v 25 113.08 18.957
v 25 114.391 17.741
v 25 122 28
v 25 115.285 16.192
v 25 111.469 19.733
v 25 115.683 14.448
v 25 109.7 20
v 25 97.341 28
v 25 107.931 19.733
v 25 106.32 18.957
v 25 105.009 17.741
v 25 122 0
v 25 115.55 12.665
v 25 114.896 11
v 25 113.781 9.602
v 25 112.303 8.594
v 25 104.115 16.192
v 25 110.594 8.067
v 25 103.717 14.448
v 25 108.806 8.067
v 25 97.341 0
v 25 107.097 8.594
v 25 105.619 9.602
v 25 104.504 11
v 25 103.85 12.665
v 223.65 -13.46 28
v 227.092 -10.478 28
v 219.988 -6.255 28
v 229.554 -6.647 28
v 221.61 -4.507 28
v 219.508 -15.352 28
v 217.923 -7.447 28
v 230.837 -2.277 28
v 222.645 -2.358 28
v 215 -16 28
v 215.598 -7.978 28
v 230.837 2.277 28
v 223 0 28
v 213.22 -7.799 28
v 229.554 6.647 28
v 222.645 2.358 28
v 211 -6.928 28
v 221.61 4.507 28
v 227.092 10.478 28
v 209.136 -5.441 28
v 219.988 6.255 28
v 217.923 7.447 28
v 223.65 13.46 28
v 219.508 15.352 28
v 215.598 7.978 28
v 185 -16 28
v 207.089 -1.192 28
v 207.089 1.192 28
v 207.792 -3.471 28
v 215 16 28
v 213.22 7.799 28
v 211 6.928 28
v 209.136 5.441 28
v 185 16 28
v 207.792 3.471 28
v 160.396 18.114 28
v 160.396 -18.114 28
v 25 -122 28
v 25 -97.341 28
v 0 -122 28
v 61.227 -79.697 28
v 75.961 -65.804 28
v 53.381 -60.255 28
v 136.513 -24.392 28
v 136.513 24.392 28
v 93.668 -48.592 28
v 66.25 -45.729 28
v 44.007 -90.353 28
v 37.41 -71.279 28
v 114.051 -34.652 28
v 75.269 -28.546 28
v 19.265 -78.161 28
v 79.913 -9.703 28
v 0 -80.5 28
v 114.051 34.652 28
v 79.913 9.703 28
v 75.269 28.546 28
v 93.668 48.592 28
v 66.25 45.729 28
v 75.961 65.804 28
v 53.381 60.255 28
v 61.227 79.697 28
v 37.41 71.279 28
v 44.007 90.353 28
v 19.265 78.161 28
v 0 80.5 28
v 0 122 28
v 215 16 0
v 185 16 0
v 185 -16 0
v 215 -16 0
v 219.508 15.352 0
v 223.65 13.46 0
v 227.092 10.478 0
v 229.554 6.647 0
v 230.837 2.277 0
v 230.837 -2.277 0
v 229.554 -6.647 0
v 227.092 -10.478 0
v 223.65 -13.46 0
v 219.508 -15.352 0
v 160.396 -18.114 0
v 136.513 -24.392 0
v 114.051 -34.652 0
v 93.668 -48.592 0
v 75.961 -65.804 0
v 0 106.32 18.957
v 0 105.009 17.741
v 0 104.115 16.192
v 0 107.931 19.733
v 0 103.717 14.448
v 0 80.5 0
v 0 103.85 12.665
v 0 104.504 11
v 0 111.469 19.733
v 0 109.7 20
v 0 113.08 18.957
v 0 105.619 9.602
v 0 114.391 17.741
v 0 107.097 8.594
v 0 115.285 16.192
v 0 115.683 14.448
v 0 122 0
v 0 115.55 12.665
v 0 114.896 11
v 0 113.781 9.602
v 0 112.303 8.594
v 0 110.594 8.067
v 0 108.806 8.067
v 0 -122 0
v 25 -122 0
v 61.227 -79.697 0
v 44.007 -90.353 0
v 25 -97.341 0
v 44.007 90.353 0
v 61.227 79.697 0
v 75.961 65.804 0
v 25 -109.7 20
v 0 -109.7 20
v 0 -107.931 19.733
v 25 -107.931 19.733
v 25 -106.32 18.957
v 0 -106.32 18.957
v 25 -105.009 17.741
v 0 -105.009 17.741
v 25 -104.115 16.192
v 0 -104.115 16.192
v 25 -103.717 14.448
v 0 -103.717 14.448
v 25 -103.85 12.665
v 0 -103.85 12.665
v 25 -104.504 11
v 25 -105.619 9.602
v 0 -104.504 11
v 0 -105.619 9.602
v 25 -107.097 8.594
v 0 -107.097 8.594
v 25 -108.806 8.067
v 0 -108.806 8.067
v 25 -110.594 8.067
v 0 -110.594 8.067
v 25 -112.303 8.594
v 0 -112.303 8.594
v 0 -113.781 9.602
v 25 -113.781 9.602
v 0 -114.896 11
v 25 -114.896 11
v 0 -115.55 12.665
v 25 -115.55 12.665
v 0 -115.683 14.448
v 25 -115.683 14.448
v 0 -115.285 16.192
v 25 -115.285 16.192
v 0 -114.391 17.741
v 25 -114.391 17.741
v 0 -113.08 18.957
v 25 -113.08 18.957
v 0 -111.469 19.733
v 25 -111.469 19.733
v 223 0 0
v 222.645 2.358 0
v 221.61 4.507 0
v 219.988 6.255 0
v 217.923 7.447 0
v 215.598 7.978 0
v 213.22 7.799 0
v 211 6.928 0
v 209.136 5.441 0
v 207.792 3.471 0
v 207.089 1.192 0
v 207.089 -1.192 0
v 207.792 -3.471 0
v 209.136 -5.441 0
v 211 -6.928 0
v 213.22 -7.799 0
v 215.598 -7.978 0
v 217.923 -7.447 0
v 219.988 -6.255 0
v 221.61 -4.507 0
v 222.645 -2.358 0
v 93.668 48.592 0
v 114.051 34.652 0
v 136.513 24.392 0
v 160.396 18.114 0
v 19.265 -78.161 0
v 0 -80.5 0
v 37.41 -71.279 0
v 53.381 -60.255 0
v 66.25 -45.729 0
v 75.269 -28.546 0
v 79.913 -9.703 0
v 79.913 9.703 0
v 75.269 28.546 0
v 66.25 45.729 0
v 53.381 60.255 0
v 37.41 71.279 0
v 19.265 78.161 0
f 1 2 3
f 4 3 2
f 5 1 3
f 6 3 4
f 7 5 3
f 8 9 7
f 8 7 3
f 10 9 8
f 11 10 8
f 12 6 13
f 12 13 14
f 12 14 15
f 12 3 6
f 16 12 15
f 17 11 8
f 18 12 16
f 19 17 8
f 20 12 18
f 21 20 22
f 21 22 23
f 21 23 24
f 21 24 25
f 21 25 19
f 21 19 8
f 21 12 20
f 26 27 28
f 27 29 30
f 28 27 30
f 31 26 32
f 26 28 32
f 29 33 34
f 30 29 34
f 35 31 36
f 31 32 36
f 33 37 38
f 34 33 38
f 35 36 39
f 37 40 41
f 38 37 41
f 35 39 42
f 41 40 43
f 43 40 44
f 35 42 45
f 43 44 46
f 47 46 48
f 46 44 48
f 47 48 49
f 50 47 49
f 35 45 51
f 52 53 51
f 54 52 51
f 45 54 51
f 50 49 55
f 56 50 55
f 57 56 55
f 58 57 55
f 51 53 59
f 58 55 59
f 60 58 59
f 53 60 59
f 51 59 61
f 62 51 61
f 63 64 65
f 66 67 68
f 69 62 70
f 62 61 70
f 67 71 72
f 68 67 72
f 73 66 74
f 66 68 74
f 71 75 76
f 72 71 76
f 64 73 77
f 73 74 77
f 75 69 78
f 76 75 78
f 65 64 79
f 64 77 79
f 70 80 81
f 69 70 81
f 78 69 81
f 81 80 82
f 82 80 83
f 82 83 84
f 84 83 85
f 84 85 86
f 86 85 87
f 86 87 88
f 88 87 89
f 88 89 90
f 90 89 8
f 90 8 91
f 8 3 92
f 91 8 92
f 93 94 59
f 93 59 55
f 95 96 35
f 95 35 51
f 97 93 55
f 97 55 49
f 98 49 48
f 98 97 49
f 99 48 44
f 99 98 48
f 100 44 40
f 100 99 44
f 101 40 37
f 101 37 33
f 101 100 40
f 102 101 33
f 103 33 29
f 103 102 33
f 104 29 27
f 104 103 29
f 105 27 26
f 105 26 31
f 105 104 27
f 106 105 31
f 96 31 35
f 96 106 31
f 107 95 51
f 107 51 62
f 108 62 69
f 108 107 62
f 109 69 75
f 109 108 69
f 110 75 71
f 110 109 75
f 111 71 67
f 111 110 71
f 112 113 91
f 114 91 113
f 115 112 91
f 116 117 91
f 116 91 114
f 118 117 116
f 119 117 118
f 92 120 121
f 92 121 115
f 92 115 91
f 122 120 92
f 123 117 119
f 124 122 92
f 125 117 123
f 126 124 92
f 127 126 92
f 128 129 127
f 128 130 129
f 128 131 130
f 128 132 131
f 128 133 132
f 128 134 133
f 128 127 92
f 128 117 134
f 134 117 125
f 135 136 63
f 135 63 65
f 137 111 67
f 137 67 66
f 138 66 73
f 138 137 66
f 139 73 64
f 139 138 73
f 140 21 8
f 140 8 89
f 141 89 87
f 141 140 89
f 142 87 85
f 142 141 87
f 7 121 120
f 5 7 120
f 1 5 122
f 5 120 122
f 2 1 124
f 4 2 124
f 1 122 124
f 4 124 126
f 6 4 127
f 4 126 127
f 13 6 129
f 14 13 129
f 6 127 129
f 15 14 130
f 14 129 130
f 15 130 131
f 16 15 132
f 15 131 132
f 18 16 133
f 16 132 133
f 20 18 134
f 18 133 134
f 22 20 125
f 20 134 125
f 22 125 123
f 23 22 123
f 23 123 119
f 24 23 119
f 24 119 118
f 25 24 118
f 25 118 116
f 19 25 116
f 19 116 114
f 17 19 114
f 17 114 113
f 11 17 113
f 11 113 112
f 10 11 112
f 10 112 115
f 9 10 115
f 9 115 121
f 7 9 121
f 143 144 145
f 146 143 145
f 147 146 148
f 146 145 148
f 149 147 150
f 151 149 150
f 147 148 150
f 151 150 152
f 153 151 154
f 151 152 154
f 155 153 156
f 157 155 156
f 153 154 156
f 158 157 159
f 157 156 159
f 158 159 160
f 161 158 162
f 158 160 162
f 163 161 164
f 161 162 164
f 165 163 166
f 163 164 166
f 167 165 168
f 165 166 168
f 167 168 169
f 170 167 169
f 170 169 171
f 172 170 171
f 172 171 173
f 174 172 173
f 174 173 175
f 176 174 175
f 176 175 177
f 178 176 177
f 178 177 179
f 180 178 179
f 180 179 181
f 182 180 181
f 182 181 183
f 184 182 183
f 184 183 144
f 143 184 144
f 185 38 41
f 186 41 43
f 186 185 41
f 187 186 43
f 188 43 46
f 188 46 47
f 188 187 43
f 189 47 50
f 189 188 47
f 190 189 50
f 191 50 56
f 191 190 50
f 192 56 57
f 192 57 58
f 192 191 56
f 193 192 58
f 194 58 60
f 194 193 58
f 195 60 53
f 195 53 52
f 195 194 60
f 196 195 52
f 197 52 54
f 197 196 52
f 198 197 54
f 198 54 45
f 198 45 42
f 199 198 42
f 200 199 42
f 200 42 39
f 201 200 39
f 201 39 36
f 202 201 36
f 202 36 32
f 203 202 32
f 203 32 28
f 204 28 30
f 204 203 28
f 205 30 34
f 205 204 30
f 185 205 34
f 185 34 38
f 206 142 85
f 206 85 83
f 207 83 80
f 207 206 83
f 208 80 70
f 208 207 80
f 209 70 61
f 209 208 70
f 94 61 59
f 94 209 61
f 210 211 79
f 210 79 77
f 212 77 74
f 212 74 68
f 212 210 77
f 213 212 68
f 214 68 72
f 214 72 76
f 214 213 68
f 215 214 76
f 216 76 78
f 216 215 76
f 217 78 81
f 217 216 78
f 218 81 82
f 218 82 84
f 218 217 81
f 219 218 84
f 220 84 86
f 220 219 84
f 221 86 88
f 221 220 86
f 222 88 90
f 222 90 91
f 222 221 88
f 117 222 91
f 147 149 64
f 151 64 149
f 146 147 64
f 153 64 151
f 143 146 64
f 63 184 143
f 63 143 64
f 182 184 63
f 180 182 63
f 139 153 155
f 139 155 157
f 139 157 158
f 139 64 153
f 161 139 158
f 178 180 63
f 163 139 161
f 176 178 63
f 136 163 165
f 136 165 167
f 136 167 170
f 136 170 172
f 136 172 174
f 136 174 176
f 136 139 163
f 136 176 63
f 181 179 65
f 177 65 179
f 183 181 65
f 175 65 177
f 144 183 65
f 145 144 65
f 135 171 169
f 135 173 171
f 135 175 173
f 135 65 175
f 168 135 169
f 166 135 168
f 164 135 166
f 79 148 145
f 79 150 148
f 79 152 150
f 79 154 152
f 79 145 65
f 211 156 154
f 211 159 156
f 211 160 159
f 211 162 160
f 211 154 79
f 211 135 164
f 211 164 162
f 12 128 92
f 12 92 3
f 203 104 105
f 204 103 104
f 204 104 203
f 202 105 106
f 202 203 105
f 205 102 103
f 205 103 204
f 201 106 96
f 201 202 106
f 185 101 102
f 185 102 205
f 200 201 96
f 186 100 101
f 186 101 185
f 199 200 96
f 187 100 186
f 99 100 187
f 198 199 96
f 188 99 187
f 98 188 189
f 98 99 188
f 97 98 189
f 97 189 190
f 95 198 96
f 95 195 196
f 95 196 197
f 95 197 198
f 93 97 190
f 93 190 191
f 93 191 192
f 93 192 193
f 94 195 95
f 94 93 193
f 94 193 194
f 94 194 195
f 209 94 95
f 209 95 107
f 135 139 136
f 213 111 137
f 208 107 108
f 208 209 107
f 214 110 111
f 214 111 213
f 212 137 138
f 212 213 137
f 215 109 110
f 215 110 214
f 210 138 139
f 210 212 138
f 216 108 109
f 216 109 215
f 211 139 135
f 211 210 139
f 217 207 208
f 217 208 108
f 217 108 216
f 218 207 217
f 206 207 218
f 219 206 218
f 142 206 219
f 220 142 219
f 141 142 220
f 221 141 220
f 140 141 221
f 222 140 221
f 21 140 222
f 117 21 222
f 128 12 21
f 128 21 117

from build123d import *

# Parameters (mm, degrees)
SKETCH1_R           = 8
BOSS_EXTRUDE1_DEPTH = 28
SKETCH2_R           = 6
CUT_EXTRUDE1_DEPTH  = 28


with BuildPart() as part:
    # Sketch1 → Boss-Extrude1 (new body)
    with BuildSketch(Plane.XY):
        with BuildLine():
            Line((0, -122), (0, -80.5))
            ThreePointArc((0, -80.5), (80.5, 0), (0, 80.5))
            Line((0, 80.5), (0, 122))
            Line((0, 122), (25, 122))
            Line((25, 122), (25, 97.340895825))
            ThreePointArc((25, 97.340895825), (52.885741133, 85.459630146), (75.960679556, 65.804446365))
            ThreePointArc((75.960679556, 65.804446365), (125.062415213, 29.040494844), (185, 16))
            Line((185, 16), (215, 16))
            ThreePointArc((215, 16), (231, 0), (215, -16))
            Line((215, -16), (185, -16))
            ThreePointArc((185, -16), (125.062415213, -29.040494844), (75.960679556, -65.804446365))
            ThreePointArc((75.960679556, -65.804446365), (52.885741133, -85.459630146), (25, -97.340895825))
            Line((25, -97.340895825), (25, -122))
            Line((25, -122), (0, -122))
        make_face()
        with Locations((215, 0)):
            Circle(SKETCH1_R, mode=Mode.SUBTRACT)
    extrude(amount=BOSS_EXTRUDE1_DEPTH)

    # Sketch2 → Cut-Extrude1 (cut)
    with BuildSketch(Plane.ZY):
        with Locations((14, 109.7)):
            Circle(SKETCH2_R)
        with Locations((14, -109.7)):
            Circle(SKETCH2_R)
    extrude(amount=-CUT_EXTRUDE1_DEPTH, mode=Mode.SUBTRACT)


solid = part.part
